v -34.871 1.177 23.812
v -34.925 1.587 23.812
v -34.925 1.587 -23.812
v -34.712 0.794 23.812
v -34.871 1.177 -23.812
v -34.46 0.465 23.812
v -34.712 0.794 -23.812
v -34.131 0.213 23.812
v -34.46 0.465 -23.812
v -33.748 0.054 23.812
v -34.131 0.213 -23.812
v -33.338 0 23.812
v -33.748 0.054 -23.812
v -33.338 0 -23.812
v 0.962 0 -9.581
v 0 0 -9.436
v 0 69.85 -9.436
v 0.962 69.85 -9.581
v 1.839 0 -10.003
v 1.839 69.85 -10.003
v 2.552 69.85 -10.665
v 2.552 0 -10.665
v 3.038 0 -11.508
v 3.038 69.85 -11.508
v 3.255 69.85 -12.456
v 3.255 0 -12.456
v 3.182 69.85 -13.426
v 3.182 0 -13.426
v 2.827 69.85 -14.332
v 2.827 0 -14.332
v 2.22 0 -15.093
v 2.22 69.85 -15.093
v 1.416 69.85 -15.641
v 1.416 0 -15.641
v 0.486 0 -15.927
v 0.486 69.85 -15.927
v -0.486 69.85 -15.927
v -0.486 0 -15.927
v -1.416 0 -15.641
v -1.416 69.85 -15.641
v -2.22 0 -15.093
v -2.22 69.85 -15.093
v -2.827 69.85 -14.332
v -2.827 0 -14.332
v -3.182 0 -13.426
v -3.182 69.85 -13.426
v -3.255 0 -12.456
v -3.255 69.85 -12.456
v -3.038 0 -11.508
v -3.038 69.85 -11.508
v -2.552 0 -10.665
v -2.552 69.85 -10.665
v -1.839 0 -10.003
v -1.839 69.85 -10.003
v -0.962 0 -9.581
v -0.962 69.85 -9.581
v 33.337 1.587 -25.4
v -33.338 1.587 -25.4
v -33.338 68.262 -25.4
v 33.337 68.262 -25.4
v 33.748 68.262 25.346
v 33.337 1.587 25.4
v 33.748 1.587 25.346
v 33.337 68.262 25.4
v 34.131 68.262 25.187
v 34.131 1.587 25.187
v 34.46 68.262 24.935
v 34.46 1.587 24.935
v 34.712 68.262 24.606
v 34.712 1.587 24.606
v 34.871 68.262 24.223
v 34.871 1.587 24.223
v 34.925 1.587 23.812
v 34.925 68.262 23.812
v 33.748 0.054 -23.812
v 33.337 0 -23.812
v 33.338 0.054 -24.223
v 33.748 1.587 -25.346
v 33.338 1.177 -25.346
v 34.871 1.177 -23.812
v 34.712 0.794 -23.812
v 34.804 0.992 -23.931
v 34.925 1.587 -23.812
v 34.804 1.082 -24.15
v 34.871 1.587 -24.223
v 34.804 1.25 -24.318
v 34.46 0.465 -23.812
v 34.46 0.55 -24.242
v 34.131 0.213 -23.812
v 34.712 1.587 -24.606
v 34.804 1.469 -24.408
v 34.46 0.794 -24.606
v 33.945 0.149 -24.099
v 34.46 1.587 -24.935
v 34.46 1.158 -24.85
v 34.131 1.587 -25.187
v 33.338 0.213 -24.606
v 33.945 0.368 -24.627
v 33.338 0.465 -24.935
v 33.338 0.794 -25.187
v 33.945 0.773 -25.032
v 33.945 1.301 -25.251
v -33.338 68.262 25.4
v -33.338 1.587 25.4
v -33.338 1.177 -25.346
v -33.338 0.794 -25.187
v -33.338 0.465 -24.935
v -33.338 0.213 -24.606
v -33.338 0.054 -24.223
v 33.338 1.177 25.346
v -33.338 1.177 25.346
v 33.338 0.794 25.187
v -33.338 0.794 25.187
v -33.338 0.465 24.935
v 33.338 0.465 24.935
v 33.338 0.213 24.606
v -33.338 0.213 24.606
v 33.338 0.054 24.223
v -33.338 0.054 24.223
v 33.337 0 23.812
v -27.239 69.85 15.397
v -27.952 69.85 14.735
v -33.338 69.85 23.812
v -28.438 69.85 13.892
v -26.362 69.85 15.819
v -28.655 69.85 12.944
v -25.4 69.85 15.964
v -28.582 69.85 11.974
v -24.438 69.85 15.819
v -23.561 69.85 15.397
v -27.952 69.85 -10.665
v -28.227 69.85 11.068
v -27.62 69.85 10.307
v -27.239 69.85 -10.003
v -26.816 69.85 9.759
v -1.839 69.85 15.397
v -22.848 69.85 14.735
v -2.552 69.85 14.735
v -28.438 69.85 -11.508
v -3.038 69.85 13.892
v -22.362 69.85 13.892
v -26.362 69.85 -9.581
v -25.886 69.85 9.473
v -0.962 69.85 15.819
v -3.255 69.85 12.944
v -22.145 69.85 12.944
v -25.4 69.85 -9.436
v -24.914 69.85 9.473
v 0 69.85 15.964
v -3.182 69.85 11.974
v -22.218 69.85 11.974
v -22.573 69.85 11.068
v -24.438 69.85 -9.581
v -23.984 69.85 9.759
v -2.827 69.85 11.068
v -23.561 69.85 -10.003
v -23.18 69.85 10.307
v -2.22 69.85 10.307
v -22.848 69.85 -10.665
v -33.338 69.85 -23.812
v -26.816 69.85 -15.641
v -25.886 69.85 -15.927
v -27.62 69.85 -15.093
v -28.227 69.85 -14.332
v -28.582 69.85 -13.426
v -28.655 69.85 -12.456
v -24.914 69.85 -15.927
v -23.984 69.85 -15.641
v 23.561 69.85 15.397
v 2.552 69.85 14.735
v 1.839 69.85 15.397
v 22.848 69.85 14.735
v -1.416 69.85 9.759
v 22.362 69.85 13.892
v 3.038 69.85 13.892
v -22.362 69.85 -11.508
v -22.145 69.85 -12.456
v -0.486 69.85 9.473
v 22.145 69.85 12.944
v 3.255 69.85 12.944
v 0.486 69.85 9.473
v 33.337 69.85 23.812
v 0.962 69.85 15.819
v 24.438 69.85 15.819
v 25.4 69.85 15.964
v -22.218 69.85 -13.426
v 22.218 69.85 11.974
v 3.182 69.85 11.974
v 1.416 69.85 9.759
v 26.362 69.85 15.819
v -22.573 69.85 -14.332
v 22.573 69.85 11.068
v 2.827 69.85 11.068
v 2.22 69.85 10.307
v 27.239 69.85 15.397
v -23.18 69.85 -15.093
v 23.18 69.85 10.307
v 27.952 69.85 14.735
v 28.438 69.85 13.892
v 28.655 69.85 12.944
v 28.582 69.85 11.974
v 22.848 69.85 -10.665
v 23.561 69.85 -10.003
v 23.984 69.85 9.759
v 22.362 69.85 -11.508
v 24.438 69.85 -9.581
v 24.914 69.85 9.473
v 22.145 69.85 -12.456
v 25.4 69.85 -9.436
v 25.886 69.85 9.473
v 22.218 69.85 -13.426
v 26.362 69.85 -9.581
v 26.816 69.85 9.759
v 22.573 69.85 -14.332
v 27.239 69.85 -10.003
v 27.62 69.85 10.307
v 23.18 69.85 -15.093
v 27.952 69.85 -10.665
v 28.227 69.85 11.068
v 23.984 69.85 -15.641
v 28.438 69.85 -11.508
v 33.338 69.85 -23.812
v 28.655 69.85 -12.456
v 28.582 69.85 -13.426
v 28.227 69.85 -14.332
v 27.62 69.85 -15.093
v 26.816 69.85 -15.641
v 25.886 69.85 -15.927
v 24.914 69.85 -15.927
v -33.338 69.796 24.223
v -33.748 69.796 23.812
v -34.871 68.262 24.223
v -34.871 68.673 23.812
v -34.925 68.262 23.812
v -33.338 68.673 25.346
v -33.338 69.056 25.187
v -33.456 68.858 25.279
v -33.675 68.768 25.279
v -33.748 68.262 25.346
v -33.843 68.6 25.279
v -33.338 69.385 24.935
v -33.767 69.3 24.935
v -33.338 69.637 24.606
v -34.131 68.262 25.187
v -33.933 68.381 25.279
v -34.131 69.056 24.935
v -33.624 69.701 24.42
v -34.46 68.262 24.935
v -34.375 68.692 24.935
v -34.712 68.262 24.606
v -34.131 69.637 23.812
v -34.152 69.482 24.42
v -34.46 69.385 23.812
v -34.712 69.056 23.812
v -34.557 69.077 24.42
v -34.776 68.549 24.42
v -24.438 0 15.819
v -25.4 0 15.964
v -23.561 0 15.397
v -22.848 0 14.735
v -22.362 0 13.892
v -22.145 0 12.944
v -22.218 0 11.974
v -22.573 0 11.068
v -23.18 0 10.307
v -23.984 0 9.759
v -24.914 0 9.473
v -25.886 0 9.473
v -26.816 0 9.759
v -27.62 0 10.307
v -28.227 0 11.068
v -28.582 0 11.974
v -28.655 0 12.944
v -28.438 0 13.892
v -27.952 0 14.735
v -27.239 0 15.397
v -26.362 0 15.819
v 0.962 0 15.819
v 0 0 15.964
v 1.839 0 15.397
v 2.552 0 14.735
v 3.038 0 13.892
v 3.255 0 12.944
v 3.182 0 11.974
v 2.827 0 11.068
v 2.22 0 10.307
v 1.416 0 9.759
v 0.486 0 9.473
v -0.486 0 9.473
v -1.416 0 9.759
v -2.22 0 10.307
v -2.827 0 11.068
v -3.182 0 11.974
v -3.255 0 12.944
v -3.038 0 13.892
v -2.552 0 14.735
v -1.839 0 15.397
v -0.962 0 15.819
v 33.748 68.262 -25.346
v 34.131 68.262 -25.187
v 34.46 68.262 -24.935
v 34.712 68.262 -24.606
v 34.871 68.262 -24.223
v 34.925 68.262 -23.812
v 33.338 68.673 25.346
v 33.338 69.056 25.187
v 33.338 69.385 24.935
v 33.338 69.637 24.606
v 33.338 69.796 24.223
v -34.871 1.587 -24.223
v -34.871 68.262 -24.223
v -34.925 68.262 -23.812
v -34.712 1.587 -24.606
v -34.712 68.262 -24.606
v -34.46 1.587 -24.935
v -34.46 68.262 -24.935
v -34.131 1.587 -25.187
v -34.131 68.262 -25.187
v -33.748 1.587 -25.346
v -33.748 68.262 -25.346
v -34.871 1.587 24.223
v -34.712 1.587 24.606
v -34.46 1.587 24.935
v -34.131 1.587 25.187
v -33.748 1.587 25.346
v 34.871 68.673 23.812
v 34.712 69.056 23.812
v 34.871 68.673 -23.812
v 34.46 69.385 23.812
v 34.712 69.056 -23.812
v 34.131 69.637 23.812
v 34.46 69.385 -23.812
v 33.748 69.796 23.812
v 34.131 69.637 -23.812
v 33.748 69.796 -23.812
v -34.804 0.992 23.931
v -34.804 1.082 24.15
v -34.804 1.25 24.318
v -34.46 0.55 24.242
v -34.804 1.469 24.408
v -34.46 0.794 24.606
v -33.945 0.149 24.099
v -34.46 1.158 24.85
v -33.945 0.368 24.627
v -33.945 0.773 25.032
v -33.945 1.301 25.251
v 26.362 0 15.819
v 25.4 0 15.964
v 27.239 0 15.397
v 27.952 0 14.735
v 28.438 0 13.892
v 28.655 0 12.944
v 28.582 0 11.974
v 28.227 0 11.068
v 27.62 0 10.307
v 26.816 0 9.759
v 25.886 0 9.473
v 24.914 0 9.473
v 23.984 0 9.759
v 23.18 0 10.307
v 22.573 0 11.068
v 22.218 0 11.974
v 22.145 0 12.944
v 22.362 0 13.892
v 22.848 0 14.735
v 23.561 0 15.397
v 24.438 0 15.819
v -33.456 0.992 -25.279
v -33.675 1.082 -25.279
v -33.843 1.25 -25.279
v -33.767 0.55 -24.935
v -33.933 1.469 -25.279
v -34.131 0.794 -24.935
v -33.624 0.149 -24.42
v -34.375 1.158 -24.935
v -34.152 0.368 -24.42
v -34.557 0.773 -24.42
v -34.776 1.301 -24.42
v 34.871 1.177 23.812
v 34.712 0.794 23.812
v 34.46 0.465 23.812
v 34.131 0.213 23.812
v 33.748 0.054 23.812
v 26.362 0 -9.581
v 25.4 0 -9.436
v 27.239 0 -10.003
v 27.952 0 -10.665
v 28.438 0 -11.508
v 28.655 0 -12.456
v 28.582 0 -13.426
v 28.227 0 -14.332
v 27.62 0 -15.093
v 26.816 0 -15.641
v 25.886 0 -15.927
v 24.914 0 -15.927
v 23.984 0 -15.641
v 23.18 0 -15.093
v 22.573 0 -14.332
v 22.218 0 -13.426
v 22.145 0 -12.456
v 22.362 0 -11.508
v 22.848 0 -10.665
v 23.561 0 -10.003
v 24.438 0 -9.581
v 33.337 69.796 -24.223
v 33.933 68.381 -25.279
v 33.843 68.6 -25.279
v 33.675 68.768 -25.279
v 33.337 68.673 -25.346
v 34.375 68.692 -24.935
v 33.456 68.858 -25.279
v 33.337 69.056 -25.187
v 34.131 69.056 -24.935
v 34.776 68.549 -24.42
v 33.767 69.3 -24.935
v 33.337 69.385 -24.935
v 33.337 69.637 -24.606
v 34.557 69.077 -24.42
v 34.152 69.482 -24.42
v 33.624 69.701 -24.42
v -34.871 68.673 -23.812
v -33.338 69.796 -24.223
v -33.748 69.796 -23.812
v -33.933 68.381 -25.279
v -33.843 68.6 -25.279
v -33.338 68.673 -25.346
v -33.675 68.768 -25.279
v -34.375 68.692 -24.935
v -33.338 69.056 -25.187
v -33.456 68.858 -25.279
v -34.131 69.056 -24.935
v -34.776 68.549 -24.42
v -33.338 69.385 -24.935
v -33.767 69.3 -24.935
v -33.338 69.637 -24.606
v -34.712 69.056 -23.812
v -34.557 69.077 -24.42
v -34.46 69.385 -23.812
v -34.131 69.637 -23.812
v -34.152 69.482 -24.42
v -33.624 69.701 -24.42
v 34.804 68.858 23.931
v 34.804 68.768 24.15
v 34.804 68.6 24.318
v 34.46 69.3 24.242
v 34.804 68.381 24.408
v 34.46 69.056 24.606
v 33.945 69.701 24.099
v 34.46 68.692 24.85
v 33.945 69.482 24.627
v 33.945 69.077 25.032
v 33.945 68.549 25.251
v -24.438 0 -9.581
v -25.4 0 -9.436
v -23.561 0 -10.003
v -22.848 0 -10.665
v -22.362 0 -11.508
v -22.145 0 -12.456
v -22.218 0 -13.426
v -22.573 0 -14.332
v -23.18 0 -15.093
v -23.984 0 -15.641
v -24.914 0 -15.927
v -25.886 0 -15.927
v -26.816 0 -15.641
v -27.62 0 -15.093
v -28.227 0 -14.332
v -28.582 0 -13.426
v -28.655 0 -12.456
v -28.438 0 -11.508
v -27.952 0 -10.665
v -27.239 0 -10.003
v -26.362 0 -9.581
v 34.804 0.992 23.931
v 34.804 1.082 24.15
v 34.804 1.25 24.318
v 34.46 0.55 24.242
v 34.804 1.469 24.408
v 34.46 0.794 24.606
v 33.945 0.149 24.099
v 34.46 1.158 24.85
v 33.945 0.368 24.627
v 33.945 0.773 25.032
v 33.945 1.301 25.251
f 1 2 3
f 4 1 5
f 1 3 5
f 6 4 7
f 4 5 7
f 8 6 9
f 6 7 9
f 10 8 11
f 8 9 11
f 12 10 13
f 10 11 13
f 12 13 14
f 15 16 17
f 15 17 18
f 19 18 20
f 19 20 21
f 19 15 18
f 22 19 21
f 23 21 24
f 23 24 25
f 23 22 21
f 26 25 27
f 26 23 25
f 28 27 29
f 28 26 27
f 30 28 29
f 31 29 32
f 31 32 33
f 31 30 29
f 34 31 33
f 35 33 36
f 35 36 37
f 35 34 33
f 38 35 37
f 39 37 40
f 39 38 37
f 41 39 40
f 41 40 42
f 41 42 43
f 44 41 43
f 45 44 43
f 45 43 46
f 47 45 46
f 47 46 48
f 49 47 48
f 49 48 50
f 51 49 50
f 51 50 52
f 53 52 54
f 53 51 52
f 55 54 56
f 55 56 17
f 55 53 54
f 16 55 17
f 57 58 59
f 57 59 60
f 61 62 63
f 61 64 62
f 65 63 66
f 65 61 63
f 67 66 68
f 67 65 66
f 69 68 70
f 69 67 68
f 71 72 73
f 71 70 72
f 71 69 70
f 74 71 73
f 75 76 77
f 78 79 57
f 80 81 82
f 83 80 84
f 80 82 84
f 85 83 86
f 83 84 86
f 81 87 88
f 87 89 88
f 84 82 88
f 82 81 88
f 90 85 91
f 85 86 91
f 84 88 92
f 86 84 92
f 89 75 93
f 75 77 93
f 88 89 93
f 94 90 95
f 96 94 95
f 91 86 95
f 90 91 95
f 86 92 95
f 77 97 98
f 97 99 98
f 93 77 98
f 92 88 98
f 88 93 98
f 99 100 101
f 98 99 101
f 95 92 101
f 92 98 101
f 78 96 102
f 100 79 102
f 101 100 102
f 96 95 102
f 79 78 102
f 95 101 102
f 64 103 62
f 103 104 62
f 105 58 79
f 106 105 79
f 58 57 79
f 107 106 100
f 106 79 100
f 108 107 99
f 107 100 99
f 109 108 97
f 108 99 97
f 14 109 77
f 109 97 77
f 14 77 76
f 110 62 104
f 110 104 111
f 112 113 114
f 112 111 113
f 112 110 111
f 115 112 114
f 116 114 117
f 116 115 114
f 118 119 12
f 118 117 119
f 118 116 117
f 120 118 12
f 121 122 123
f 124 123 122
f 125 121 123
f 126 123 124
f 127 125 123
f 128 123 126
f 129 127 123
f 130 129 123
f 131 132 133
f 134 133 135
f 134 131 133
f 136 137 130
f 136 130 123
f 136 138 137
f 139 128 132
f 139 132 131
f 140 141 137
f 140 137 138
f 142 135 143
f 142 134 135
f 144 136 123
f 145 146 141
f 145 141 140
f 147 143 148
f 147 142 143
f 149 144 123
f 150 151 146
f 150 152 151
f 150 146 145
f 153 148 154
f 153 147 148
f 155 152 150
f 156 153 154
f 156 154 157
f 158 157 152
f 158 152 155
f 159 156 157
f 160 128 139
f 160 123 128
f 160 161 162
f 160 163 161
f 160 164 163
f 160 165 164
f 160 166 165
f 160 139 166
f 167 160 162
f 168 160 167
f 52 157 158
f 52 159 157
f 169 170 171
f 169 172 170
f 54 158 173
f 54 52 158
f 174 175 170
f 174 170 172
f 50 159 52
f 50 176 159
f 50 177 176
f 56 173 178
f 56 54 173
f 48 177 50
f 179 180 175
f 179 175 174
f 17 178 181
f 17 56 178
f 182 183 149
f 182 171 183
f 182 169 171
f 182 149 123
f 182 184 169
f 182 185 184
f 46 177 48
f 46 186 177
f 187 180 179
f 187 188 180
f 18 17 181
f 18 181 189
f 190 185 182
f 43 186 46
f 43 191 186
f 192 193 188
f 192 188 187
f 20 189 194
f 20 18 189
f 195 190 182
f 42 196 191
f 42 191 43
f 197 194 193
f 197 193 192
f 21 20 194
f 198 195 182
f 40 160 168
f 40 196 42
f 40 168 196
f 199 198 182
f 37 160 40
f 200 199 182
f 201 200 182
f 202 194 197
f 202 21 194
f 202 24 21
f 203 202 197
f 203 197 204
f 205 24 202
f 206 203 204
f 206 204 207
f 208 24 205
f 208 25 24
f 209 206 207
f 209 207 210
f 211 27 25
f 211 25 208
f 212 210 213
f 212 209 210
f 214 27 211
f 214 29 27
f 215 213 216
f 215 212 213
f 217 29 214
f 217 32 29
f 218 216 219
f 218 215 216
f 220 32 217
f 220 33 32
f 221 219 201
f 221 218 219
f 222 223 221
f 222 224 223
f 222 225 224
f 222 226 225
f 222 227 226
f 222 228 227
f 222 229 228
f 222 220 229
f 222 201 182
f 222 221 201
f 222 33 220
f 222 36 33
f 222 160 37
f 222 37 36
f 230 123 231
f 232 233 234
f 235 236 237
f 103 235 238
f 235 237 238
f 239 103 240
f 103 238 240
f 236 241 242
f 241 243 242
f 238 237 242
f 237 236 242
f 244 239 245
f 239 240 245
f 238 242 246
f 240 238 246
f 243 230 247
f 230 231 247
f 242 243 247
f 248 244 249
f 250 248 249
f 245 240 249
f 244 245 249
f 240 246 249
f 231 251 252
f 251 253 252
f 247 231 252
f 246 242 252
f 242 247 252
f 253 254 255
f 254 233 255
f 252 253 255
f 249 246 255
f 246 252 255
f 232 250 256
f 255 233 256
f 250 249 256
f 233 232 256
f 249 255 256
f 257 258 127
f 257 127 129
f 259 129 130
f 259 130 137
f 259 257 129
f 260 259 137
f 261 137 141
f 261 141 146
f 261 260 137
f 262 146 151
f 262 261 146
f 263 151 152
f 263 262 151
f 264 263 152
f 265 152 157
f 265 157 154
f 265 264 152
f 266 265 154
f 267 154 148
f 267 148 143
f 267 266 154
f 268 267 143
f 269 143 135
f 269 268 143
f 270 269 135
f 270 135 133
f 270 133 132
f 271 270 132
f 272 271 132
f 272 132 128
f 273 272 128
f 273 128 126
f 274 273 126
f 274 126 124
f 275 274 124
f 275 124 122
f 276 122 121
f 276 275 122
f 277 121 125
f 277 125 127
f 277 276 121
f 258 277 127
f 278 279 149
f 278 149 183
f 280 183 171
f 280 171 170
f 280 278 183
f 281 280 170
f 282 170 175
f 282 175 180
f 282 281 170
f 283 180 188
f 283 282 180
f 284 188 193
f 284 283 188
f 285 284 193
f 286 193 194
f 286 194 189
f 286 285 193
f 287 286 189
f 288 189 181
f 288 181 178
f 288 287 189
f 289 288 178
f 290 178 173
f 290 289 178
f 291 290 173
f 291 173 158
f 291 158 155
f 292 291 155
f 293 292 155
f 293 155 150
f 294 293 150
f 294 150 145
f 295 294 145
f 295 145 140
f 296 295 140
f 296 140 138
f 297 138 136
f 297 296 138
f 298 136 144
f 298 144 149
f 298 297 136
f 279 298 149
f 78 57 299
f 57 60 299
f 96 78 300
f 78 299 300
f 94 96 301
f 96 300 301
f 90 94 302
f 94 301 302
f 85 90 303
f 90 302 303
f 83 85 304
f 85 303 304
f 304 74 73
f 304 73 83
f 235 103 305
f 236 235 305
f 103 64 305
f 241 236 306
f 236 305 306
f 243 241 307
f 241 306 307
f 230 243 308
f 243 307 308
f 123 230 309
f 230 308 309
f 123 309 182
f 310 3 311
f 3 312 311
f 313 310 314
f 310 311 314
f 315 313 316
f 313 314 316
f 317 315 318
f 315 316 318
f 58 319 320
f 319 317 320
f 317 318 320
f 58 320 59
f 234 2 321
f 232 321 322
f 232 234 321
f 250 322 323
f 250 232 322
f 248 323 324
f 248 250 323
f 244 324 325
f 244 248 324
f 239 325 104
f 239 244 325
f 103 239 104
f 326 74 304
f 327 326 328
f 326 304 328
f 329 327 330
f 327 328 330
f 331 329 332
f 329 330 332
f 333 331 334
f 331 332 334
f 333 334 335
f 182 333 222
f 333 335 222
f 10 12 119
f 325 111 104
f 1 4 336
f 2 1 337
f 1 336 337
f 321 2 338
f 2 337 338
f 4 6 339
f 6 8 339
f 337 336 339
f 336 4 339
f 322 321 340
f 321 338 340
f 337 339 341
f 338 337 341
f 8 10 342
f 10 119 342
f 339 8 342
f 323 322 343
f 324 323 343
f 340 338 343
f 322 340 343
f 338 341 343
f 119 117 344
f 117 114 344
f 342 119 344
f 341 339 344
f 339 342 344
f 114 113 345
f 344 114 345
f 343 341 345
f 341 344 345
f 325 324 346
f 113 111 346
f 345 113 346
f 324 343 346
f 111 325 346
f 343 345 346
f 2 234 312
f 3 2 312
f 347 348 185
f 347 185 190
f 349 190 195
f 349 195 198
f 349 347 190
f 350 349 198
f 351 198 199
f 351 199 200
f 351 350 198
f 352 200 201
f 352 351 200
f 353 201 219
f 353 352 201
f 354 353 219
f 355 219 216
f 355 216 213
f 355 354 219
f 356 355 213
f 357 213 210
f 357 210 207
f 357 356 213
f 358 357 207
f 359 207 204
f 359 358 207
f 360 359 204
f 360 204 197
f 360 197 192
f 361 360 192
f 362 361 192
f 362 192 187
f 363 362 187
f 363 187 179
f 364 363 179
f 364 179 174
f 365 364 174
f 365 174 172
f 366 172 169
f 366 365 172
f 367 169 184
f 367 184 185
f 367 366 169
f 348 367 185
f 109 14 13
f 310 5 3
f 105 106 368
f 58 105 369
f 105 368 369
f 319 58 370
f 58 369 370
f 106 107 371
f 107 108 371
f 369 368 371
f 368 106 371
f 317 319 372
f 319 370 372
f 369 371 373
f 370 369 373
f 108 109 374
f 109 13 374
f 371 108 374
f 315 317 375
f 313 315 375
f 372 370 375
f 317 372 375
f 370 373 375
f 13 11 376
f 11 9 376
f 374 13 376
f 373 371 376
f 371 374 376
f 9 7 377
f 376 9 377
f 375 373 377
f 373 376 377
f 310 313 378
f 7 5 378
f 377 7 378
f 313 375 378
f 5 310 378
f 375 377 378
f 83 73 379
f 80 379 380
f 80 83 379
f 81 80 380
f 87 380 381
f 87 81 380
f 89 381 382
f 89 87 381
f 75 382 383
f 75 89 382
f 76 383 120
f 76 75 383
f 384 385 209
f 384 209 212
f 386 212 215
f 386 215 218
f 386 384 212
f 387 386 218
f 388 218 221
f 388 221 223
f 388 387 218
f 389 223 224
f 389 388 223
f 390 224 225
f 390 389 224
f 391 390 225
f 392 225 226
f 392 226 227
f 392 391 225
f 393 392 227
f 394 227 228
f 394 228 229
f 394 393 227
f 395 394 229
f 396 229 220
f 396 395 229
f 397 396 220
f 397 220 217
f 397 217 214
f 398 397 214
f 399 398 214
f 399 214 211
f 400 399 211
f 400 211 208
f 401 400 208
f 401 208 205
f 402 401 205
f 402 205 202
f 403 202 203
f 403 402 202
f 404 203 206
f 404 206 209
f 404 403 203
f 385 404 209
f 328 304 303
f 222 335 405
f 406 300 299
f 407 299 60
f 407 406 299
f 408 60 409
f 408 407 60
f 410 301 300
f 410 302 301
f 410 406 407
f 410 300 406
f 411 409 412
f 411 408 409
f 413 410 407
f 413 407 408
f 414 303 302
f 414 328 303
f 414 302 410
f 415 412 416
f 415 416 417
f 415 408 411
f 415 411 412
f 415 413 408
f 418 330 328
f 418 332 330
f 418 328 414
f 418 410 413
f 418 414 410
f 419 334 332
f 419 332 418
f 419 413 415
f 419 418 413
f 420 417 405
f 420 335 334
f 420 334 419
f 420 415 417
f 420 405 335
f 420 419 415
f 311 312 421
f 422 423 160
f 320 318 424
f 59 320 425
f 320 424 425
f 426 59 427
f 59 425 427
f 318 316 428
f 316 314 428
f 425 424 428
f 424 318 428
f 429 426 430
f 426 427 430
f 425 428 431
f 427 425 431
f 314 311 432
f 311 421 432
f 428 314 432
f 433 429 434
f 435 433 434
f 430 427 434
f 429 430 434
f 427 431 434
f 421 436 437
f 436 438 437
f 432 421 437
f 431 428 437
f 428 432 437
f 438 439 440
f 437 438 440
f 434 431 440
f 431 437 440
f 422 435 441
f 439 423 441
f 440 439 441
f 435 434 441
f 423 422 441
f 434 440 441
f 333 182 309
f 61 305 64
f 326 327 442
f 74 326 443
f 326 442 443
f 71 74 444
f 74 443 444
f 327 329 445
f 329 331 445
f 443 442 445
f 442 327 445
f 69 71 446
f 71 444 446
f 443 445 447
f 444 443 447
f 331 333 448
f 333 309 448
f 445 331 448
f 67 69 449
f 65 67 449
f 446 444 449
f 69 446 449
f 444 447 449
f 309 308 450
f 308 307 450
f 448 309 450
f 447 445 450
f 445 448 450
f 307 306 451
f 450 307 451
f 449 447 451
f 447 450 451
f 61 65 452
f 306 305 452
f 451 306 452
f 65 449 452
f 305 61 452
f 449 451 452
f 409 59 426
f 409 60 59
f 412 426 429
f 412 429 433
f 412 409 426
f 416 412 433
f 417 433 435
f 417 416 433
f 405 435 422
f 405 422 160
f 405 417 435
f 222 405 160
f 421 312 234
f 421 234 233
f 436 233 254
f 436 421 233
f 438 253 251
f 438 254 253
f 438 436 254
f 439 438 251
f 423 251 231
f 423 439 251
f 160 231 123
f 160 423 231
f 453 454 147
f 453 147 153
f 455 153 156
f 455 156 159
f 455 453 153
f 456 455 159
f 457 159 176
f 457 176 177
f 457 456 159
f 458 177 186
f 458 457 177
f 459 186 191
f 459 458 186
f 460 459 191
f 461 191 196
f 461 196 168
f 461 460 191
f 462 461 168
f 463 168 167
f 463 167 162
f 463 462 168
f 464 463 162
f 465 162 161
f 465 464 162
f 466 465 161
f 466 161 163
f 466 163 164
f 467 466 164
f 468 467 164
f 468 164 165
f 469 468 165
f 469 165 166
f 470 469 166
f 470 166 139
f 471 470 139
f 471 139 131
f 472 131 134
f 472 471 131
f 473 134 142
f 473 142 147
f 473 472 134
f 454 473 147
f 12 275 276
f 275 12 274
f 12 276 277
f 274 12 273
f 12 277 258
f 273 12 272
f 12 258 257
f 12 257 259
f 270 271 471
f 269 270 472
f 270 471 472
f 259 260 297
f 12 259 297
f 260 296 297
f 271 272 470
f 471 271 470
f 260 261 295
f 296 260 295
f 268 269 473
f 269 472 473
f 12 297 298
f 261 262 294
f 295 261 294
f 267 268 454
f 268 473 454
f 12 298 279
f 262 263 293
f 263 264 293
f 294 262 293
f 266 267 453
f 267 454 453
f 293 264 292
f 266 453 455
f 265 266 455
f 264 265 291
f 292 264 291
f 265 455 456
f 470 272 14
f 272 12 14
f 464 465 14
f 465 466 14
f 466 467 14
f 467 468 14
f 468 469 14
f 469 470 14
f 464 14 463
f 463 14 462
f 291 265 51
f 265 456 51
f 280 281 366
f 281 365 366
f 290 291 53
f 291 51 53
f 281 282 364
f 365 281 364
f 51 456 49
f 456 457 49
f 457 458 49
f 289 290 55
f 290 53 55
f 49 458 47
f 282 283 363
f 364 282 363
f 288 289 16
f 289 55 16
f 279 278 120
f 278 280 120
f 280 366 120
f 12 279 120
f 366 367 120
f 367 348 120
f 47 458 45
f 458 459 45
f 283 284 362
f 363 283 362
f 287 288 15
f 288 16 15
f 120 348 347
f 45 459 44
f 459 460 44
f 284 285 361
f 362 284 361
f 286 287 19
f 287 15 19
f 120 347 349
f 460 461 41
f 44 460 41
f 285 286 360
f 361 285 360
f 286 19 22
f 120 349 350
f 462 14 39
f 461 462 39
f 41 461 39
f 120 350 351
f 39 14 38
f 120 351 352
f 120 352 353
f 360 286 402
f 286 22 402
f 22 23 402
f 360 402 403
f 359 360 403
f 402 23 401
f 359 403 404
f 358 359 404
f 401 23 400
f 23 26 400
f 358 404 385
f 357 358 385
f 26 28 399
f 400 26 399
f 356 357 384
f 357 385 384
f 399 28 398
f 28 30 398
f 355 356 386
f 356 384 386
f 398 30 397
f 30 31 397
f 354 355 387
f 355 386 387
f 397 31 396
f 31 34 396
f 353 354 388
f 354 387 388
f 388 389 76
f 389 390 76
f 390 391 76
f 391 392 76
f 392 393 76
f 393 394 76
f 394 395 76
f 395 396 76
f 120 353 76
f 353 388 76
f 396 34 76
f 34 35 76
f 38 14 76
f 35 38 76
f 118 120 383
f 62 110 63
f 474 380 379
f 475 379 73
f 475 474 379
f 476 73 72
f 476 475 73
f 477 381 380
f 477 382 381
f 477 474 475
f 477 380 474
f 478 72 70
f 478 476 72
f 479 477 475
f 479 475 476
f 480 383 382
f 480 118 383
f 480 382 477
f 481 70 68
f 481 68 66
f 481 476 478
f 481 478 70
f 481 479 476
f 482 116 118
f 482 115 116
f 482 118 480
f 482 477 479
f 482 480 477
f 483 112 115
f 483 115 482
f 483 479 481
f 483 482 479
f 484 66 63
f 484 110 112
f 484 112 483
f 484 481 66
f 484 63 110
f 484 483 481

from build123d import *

# Parameters (mm, degrees)
SKETCH1_W           = 69.85
SKETCH1_H           = 50.8
SKETCH1_R           = 3.2639
BOSS_EXTRUDE1_DEPTH = 69.85
FILLET1_R           = 1.5875


with BuildPart() as part:
    # Sketch1 → Boss-Extrude1 (new body)
    with BuildSketch(Plane(origin=(0, 0, 0), x_dir=(1, 0, 0), z_dir=(0, 1, 0))):
        Rectangle(SKETCH1_W, SKETCH1_H)
        with Locations(Location((-25.4, -12.7, 0), (0, 0, 270))):
            Circle(SKETCH1_R, mode=Mode.SUBTRACT)
        with Locations(Location((0, -12.7, 0), (0, 0, 270))):
            Circle(SKETCH1_R, mode=Mode.SUBTRACT)
        with Locations(Location((25.4, -12.7, 0), (0, 0, 270))):
            Circle(SKETCH1_R, mode=Mode.SUBTRACT)
        with Locations(Location((0, 12.7, 0), (0, 0, 270))):
            Circle(SKETCH1_R, mode=Mode.SUBTRACT)
        with Locations(Location((25.4, 12.7, 0), (0, 0, 270))):
            Circle(SKETCH1_R, mode=Mode.SUBTRACT)
        with Locations(Location((-25.4, 12.7, 0), (0, 0, 270))):
            Circle(SKETCH1_R, mode=Mode.SUBTRACT)
    extrude(amount=BOSS_EXTRUDE1_DEPTH)

    # Fillet1
    fillet1_edges = [part.edges().sort_by_distance(p)[0] for p in [
        (-34.925, 69.85, 0),
        (0, 69.85, 25.4),
        (34.925, 69.85, 0),
        (0, 0, 25.4),
        (-34.925, 0, 0),
        (0, 0, -25.4),
        (34.925, 0, 0),
        (34.925, 34.925, 25.4),
        (-34.925, 34.925, 25.4),
        (-34.925, 34.925, -25.4),
        (34.925, 34.925, -25.4),
        (0, 69.85, -25.4),
    ]]
    fillet(fillet1_edges, radius=FILLET1_R)


solid = part.part
